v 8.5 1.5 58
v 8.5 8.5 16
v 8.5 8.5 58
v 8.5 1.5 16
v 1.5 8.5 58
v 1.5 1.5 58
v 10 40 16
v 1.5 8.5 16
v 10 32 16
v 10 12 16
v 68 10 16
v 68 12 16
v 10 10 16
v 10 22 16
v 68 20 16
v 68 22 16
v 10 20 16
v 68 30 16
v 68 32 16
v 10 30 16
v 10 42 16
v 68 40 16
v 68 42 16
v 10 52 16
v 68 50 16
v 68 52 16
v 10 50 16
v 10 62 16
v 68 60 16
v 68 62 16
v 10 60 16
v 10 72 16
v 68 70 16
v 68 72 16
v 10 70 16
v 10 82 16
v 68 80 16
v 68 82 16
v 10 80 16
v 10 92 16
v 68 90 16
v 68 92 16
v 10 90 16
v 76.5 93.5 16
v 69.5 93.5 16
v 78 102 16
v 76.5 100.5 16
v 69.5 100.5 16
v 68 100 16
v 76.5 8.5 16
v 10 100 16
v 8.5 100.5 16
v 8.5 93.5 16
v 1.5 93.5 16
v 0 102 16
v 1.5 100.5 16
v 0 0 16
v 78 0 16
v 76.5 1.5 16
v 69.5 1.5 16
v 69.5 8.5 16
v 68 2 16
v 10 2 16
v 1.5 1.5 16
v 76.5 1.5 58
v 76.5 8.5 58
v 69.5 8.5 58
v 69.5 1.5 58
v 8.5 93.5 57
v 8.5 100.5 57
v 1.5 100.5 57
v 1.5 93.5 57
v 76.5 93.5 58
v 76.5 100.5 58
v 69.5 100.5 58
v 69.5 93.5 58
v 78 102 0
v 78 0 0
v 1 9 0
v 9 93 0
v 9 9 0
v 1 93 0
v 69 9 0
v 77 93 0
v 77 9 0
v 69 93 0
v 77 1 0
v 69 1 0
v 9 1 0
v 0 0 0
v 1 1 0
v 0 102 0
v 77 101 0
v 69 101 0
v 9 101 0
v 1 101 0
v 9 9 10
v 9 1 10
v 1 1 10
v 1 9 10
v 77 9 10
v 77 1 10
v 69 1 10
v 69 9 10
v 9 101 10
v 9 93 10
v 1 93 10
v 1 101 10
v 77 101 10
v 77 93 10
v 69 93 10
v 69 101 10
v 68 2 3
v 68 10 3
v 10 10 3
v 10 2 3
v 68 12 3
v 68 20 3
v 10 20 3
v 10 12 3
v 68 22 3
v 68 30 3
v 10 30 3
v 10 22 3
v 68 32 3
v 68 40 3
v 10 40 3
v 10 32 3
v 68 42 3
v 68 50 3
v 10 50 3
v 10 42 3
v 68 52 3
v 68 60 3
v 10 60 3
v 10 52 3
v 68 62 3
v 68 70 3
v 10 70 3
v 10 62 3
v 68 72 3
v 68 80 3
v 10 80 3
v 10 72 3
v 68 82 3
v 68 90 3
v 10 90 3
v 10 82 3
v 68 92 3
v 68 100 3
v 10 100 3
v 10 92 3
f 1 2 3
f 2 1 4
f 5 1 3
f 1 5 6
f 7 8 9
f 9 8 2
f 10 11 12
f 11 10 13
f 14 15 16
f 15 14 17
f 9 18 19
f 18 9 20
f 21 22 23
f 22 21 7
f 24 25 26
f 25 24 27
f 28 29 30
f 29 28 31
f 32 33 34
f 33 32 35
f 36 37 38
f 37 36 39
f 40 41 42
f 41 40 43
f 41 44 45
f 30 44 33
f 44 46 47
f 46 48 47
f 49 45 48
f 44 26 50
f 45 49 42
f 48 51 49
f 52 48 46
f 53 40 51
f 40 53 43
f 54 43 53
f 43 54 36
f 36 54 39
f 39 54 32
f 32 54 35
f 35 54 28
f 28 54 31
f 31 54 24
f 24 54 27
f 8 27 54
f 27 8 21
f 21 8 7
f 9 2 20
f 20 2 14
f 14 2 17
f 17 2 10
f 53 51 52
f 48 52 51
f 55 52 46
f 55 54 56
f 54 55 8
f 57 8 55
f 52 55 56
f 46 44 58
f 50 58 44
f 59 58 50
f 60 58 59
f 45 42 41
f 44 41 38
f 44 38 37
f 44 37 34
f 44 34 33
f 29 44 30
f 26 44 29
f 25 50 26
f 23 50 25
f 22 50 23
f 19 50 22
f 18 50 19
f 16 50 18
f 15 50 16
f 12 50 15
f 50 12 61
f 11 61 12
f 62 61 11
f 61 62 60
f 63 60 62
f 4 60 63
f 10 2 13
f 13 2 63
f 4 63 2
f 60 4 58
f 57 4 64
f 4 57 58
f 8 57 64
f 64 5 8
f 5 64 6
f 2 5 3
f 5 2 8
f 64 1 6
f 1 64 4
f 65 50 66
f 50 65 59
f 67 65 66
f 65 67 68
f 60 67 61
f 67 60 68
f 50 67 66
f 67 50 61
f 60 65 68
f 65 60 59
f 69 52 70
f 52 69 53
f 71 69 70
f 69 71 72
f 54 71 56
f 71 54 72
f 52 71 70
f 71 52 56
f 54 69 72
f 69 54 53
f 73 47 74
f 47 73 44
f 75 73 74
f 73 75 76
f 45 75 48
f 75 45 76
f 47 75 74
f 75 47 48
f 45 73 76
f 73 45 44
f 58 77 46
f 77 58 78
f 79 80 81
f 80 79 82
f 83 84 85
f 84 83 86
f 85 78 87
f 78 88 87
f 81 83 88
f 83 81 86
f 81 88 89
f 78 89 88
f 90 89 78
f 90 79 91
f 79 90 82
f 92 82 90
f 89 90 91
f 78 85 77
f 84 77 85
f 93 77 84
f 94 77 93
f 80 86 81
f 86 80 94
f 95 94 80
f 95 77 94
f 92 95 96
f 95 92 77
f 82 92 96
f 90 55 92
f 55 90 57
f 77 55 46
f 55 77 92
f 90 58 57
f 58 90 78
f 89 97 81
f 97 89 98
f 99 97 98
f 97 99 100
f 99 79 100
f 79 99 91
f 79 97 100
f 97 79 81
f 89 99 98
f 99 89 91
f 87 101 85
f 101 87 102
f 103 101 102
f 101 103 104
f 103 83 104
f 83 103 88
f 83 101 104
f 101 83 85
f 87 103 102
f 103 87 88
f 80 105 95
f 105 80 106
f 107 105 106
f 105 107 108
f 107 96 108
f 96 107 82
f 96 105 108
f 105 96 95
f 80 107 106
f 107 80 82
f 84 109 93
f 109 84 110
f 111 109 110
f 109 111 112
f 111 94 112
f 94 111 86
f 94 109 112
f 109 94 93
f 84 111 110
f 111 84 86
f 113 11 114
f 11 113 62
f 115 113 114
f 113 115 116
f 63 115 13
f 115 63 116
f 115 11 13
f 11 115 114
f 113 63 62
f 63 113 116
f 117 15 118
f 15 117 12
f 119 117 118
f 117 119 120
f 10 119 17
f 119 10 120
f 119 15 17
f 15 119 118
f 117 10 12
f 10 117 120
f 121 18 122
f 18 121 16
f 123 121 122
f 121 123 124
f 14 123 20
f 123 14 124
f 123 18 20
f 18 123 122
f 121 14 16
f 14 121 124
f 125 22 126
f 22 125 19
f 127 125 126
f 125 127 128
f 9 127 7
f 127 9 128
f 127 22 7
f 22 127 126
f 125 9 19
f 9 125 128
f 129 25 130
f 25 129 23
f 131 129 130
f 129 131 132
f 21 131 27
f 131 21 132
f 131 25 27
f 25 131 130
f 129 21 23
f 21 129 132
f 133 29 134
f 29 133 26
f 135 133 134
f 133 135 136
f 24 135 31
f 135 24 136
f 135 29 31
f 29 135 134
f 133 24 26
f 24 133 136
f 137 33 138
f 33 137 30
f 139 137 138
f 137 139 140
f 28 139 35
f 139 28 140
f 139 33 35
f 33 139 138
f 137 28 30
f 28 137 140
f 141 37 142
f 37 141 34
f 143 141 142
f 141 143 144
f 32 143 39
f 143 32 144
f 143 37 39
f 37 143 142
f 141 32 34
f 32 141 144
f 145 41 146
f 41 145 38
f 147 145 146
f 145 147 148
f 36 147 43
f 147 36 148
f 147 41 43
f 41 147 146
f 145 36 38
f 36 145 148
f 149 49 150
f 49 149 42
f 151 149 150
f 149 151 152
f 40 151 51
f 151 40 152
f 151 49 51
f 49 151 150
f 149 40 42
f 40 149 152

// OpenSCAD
// Gameboy Cartridge Holder version 2.0
// Design by Patrick Connelly (patrick@deadlypenguin.com)

// preview[view:south east, tilt:top diagonal]

/* [Cartridge] */
cartridge_type = "gba"; //[gba: Gameboy Advanced,gbc:Gameboy Classic,both: Both]
number_of_cartridges = 10; //[5:15]
allow_cartridge_removal = "no"; // [yes,no]

/* [Hidden] */
cart_width = 58;
cart_depth = 8;
gba_cart_height = 35;
gbc_cart_height = 65;

cart_pocket_height = 14;
cart_pocket_gap = 2;

base_height = 16;

no_remove_padding = 10;

support_rod_width = 7;
support_rod_depth = support_rod_width;

support_pocket_inner_padding = 1;

support_pocket_width = support_rod_width + support_pocket_inner_padding;
support_pocket_depth = support_rod_depth + support_pocket_inner_padding;
support_pocket_height = 10;
support_pocket_padding = 1;

cart_height = (cartridge_type == "gba") ? gba_cart_height : gbc_cart_height;
cart_padding = (allow_cartridge_removal == "no") ? no_remove_padding : no_remove_padding + cart_height;

// Default to gba with no-remove
support_rod_height = (cart_height - cart_pocket_height) + cart_padding + support_pocket_height;

echo(support_rod_height);
support_rod_padding = support_pocket_padding + ((support_pocket_width - support_rod_width) / 2);

base_depth = (cart_depth + cart_pocket_gap) * number_of_cartridges + cart_pocket_gap;

side_rail_width = support_pocket_width + support_pocket_padding * 2;

base_width = cart_width + side_rail_width * 2;

module base() {
	cube([base_width, base_depth, base_height]);
}

module support_pockets() {
	support_pocket_x = base_width - support_pocket_padding - support_pocket_width;
	support_pocket_y = base_depth - support_pocket_padding - support_pocket_width;
	union() {
		translate([support_pocket_padding,support_pocket_padding,-1])
			cube([support_pocket_width, support_pocket_depth, support_pocket_height + 1]);
		translate([support_pocket_x, support_pocket_padding, -1])
		cube([support_pocket_width, support_pocket_depth, support_pocket_height + 1]);
		translate([support_pocket_padding, support_pocket_y, -1])
		cube([support_pocket_width, support_pocket_depth, support_pocket_height + 1]);
		translate([support_pocket_x, support_pocket_y, -1])
		cube([support_pocket_width, support_pocket_depth, support_pocket_height + 1]);
	}
}

module support_rods() {
	support_rod_x = base_width - support_rod_padding - support_rod_width;
	support_rod_y = base_depth - support_rod_padding - support_rod_width;
	
	union() {
		translate([support_rod_padding,support_rod_padding,base_height])
			cube([support_rod_width, support_rod_depth, support_rod_height + 1]);
		translate([support_rod_x, support_rod_padding, base_height])
		cube([support_rod_width, support_rod_depth, support_rod_height + 1]);
		translate([support_rod_padding, support_rod_y, base_height])
		cube([support_rod_width, support_rod_depth, support_rod_height]);
		translate([support_rod_x, support_rod_y, base_height])
		cube([support_rod_width, support_rod_depth, support_rod_height + 1]);
	}
}

module cartridge_slots() {
	union() {
		for (i = [0:number_of_cartridges - 1]) {
			current_y = cart_pocket_gap + ((cart_depth + cart_pocket_gap) * i);
			translate([side_rail_width, current_y, base_height - cart_pocket_height + 1])
			cube([cart_width, cart_depth, cart_pocket_height + 1]);
		}
	}
}

difference() {
	union() {
		base();
		support_rods();
	}
	support_pockets();
	cartridge_slots();
}
